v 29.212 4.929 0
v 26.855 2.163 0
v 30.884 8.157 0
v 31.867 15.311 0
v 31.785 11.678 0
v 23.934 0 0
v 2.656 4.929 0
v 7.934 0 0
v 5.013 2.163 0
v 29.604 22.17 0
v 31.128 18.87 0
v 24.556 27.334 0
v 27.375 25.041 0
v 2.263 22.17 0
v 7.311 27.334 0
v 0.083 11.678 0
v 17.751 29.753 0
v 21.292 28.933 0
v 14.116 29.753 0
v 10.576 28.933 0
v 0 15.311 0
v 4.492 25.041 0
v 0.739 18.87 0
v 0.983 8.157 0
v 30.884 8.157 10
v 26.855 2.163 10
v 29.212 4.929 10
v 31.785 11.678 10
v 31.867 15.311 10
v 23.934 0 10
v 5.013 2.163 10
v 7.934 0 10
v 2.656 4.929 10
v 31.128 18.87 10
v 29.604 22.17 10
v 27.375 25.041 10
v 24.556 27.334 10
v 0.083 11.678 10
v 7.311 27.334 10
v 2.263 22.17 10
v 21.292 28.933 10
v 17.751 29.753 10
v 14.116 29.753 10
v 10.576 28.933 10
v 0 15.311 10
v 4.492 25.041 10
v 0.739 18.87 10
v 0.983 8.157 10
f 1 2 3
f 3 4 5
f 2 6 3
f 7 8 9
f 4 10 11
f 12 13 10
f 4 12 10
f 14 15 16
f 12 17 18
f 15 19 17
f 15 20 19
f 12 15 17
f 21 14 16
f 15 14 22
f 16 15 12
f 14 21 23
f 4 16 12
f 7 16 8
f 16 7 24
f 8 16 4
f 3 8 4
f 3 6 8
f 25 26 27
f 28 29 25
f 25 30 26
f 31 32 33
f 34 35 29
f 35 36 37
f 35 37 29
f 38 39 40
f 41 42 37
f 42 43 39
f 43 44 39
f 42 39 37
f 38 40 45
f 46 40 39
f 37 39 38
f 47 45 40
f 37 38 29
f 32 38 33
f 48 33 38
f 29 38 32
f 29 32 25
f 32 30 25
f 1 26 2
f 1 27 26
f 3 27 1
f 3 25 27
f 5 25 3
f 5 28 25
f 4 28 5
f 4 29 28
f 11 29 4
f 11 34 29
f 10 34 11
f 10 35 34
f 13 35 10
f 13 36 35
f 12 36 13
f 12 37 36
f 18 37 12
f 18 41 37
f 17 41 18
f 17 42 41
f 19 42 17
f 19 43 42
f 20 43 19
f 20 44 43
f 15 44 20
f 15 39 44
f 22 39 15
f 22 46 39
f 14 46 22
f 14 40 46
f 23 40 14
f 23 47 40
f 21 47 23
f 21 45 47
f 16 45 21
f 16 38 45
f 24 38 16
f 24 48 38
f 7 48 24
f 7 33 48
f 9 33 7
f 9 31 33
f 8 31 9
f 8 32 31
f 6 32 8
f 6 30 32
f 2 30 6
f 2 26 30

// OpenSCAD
$fn = 32;

// ----------------------------------------------------------------------
// Flat adaptor: single_d, 10 mm thick
// ----------------------------------------------------------------------

// --- parameters (mm) ---
profile_height = 10;      // extrusion height
profile_points = 24;      // points of the closed outline

profile = [[23.934, 0], [26.855, 2.163], [29.212, 4.929], [30.884, 8.157], [31.785, 11.678], [31.867, 15.311], [31.128, 18.87], [29.604, 22.17], [27.375, 25.041], [24.556, 27.334], [21.292, 28.933], [17.751, 29.753], [14.116, 29.753], [10.576, 28.933], [7.311, 27.334], [4.492, 25.041], [2.263, 22.17], [0.739, 18.87], [0, 15.311], [0.083, 11.678], [0.983, 8.157], [2.656, 4.929], [5.013, 2.163], [7.934, 0]];  // single closed polygon, 24 points, counter clockwise

// --- the one profile operation ---
linear_extrude(height = profile_height) polygon(points = profile);
